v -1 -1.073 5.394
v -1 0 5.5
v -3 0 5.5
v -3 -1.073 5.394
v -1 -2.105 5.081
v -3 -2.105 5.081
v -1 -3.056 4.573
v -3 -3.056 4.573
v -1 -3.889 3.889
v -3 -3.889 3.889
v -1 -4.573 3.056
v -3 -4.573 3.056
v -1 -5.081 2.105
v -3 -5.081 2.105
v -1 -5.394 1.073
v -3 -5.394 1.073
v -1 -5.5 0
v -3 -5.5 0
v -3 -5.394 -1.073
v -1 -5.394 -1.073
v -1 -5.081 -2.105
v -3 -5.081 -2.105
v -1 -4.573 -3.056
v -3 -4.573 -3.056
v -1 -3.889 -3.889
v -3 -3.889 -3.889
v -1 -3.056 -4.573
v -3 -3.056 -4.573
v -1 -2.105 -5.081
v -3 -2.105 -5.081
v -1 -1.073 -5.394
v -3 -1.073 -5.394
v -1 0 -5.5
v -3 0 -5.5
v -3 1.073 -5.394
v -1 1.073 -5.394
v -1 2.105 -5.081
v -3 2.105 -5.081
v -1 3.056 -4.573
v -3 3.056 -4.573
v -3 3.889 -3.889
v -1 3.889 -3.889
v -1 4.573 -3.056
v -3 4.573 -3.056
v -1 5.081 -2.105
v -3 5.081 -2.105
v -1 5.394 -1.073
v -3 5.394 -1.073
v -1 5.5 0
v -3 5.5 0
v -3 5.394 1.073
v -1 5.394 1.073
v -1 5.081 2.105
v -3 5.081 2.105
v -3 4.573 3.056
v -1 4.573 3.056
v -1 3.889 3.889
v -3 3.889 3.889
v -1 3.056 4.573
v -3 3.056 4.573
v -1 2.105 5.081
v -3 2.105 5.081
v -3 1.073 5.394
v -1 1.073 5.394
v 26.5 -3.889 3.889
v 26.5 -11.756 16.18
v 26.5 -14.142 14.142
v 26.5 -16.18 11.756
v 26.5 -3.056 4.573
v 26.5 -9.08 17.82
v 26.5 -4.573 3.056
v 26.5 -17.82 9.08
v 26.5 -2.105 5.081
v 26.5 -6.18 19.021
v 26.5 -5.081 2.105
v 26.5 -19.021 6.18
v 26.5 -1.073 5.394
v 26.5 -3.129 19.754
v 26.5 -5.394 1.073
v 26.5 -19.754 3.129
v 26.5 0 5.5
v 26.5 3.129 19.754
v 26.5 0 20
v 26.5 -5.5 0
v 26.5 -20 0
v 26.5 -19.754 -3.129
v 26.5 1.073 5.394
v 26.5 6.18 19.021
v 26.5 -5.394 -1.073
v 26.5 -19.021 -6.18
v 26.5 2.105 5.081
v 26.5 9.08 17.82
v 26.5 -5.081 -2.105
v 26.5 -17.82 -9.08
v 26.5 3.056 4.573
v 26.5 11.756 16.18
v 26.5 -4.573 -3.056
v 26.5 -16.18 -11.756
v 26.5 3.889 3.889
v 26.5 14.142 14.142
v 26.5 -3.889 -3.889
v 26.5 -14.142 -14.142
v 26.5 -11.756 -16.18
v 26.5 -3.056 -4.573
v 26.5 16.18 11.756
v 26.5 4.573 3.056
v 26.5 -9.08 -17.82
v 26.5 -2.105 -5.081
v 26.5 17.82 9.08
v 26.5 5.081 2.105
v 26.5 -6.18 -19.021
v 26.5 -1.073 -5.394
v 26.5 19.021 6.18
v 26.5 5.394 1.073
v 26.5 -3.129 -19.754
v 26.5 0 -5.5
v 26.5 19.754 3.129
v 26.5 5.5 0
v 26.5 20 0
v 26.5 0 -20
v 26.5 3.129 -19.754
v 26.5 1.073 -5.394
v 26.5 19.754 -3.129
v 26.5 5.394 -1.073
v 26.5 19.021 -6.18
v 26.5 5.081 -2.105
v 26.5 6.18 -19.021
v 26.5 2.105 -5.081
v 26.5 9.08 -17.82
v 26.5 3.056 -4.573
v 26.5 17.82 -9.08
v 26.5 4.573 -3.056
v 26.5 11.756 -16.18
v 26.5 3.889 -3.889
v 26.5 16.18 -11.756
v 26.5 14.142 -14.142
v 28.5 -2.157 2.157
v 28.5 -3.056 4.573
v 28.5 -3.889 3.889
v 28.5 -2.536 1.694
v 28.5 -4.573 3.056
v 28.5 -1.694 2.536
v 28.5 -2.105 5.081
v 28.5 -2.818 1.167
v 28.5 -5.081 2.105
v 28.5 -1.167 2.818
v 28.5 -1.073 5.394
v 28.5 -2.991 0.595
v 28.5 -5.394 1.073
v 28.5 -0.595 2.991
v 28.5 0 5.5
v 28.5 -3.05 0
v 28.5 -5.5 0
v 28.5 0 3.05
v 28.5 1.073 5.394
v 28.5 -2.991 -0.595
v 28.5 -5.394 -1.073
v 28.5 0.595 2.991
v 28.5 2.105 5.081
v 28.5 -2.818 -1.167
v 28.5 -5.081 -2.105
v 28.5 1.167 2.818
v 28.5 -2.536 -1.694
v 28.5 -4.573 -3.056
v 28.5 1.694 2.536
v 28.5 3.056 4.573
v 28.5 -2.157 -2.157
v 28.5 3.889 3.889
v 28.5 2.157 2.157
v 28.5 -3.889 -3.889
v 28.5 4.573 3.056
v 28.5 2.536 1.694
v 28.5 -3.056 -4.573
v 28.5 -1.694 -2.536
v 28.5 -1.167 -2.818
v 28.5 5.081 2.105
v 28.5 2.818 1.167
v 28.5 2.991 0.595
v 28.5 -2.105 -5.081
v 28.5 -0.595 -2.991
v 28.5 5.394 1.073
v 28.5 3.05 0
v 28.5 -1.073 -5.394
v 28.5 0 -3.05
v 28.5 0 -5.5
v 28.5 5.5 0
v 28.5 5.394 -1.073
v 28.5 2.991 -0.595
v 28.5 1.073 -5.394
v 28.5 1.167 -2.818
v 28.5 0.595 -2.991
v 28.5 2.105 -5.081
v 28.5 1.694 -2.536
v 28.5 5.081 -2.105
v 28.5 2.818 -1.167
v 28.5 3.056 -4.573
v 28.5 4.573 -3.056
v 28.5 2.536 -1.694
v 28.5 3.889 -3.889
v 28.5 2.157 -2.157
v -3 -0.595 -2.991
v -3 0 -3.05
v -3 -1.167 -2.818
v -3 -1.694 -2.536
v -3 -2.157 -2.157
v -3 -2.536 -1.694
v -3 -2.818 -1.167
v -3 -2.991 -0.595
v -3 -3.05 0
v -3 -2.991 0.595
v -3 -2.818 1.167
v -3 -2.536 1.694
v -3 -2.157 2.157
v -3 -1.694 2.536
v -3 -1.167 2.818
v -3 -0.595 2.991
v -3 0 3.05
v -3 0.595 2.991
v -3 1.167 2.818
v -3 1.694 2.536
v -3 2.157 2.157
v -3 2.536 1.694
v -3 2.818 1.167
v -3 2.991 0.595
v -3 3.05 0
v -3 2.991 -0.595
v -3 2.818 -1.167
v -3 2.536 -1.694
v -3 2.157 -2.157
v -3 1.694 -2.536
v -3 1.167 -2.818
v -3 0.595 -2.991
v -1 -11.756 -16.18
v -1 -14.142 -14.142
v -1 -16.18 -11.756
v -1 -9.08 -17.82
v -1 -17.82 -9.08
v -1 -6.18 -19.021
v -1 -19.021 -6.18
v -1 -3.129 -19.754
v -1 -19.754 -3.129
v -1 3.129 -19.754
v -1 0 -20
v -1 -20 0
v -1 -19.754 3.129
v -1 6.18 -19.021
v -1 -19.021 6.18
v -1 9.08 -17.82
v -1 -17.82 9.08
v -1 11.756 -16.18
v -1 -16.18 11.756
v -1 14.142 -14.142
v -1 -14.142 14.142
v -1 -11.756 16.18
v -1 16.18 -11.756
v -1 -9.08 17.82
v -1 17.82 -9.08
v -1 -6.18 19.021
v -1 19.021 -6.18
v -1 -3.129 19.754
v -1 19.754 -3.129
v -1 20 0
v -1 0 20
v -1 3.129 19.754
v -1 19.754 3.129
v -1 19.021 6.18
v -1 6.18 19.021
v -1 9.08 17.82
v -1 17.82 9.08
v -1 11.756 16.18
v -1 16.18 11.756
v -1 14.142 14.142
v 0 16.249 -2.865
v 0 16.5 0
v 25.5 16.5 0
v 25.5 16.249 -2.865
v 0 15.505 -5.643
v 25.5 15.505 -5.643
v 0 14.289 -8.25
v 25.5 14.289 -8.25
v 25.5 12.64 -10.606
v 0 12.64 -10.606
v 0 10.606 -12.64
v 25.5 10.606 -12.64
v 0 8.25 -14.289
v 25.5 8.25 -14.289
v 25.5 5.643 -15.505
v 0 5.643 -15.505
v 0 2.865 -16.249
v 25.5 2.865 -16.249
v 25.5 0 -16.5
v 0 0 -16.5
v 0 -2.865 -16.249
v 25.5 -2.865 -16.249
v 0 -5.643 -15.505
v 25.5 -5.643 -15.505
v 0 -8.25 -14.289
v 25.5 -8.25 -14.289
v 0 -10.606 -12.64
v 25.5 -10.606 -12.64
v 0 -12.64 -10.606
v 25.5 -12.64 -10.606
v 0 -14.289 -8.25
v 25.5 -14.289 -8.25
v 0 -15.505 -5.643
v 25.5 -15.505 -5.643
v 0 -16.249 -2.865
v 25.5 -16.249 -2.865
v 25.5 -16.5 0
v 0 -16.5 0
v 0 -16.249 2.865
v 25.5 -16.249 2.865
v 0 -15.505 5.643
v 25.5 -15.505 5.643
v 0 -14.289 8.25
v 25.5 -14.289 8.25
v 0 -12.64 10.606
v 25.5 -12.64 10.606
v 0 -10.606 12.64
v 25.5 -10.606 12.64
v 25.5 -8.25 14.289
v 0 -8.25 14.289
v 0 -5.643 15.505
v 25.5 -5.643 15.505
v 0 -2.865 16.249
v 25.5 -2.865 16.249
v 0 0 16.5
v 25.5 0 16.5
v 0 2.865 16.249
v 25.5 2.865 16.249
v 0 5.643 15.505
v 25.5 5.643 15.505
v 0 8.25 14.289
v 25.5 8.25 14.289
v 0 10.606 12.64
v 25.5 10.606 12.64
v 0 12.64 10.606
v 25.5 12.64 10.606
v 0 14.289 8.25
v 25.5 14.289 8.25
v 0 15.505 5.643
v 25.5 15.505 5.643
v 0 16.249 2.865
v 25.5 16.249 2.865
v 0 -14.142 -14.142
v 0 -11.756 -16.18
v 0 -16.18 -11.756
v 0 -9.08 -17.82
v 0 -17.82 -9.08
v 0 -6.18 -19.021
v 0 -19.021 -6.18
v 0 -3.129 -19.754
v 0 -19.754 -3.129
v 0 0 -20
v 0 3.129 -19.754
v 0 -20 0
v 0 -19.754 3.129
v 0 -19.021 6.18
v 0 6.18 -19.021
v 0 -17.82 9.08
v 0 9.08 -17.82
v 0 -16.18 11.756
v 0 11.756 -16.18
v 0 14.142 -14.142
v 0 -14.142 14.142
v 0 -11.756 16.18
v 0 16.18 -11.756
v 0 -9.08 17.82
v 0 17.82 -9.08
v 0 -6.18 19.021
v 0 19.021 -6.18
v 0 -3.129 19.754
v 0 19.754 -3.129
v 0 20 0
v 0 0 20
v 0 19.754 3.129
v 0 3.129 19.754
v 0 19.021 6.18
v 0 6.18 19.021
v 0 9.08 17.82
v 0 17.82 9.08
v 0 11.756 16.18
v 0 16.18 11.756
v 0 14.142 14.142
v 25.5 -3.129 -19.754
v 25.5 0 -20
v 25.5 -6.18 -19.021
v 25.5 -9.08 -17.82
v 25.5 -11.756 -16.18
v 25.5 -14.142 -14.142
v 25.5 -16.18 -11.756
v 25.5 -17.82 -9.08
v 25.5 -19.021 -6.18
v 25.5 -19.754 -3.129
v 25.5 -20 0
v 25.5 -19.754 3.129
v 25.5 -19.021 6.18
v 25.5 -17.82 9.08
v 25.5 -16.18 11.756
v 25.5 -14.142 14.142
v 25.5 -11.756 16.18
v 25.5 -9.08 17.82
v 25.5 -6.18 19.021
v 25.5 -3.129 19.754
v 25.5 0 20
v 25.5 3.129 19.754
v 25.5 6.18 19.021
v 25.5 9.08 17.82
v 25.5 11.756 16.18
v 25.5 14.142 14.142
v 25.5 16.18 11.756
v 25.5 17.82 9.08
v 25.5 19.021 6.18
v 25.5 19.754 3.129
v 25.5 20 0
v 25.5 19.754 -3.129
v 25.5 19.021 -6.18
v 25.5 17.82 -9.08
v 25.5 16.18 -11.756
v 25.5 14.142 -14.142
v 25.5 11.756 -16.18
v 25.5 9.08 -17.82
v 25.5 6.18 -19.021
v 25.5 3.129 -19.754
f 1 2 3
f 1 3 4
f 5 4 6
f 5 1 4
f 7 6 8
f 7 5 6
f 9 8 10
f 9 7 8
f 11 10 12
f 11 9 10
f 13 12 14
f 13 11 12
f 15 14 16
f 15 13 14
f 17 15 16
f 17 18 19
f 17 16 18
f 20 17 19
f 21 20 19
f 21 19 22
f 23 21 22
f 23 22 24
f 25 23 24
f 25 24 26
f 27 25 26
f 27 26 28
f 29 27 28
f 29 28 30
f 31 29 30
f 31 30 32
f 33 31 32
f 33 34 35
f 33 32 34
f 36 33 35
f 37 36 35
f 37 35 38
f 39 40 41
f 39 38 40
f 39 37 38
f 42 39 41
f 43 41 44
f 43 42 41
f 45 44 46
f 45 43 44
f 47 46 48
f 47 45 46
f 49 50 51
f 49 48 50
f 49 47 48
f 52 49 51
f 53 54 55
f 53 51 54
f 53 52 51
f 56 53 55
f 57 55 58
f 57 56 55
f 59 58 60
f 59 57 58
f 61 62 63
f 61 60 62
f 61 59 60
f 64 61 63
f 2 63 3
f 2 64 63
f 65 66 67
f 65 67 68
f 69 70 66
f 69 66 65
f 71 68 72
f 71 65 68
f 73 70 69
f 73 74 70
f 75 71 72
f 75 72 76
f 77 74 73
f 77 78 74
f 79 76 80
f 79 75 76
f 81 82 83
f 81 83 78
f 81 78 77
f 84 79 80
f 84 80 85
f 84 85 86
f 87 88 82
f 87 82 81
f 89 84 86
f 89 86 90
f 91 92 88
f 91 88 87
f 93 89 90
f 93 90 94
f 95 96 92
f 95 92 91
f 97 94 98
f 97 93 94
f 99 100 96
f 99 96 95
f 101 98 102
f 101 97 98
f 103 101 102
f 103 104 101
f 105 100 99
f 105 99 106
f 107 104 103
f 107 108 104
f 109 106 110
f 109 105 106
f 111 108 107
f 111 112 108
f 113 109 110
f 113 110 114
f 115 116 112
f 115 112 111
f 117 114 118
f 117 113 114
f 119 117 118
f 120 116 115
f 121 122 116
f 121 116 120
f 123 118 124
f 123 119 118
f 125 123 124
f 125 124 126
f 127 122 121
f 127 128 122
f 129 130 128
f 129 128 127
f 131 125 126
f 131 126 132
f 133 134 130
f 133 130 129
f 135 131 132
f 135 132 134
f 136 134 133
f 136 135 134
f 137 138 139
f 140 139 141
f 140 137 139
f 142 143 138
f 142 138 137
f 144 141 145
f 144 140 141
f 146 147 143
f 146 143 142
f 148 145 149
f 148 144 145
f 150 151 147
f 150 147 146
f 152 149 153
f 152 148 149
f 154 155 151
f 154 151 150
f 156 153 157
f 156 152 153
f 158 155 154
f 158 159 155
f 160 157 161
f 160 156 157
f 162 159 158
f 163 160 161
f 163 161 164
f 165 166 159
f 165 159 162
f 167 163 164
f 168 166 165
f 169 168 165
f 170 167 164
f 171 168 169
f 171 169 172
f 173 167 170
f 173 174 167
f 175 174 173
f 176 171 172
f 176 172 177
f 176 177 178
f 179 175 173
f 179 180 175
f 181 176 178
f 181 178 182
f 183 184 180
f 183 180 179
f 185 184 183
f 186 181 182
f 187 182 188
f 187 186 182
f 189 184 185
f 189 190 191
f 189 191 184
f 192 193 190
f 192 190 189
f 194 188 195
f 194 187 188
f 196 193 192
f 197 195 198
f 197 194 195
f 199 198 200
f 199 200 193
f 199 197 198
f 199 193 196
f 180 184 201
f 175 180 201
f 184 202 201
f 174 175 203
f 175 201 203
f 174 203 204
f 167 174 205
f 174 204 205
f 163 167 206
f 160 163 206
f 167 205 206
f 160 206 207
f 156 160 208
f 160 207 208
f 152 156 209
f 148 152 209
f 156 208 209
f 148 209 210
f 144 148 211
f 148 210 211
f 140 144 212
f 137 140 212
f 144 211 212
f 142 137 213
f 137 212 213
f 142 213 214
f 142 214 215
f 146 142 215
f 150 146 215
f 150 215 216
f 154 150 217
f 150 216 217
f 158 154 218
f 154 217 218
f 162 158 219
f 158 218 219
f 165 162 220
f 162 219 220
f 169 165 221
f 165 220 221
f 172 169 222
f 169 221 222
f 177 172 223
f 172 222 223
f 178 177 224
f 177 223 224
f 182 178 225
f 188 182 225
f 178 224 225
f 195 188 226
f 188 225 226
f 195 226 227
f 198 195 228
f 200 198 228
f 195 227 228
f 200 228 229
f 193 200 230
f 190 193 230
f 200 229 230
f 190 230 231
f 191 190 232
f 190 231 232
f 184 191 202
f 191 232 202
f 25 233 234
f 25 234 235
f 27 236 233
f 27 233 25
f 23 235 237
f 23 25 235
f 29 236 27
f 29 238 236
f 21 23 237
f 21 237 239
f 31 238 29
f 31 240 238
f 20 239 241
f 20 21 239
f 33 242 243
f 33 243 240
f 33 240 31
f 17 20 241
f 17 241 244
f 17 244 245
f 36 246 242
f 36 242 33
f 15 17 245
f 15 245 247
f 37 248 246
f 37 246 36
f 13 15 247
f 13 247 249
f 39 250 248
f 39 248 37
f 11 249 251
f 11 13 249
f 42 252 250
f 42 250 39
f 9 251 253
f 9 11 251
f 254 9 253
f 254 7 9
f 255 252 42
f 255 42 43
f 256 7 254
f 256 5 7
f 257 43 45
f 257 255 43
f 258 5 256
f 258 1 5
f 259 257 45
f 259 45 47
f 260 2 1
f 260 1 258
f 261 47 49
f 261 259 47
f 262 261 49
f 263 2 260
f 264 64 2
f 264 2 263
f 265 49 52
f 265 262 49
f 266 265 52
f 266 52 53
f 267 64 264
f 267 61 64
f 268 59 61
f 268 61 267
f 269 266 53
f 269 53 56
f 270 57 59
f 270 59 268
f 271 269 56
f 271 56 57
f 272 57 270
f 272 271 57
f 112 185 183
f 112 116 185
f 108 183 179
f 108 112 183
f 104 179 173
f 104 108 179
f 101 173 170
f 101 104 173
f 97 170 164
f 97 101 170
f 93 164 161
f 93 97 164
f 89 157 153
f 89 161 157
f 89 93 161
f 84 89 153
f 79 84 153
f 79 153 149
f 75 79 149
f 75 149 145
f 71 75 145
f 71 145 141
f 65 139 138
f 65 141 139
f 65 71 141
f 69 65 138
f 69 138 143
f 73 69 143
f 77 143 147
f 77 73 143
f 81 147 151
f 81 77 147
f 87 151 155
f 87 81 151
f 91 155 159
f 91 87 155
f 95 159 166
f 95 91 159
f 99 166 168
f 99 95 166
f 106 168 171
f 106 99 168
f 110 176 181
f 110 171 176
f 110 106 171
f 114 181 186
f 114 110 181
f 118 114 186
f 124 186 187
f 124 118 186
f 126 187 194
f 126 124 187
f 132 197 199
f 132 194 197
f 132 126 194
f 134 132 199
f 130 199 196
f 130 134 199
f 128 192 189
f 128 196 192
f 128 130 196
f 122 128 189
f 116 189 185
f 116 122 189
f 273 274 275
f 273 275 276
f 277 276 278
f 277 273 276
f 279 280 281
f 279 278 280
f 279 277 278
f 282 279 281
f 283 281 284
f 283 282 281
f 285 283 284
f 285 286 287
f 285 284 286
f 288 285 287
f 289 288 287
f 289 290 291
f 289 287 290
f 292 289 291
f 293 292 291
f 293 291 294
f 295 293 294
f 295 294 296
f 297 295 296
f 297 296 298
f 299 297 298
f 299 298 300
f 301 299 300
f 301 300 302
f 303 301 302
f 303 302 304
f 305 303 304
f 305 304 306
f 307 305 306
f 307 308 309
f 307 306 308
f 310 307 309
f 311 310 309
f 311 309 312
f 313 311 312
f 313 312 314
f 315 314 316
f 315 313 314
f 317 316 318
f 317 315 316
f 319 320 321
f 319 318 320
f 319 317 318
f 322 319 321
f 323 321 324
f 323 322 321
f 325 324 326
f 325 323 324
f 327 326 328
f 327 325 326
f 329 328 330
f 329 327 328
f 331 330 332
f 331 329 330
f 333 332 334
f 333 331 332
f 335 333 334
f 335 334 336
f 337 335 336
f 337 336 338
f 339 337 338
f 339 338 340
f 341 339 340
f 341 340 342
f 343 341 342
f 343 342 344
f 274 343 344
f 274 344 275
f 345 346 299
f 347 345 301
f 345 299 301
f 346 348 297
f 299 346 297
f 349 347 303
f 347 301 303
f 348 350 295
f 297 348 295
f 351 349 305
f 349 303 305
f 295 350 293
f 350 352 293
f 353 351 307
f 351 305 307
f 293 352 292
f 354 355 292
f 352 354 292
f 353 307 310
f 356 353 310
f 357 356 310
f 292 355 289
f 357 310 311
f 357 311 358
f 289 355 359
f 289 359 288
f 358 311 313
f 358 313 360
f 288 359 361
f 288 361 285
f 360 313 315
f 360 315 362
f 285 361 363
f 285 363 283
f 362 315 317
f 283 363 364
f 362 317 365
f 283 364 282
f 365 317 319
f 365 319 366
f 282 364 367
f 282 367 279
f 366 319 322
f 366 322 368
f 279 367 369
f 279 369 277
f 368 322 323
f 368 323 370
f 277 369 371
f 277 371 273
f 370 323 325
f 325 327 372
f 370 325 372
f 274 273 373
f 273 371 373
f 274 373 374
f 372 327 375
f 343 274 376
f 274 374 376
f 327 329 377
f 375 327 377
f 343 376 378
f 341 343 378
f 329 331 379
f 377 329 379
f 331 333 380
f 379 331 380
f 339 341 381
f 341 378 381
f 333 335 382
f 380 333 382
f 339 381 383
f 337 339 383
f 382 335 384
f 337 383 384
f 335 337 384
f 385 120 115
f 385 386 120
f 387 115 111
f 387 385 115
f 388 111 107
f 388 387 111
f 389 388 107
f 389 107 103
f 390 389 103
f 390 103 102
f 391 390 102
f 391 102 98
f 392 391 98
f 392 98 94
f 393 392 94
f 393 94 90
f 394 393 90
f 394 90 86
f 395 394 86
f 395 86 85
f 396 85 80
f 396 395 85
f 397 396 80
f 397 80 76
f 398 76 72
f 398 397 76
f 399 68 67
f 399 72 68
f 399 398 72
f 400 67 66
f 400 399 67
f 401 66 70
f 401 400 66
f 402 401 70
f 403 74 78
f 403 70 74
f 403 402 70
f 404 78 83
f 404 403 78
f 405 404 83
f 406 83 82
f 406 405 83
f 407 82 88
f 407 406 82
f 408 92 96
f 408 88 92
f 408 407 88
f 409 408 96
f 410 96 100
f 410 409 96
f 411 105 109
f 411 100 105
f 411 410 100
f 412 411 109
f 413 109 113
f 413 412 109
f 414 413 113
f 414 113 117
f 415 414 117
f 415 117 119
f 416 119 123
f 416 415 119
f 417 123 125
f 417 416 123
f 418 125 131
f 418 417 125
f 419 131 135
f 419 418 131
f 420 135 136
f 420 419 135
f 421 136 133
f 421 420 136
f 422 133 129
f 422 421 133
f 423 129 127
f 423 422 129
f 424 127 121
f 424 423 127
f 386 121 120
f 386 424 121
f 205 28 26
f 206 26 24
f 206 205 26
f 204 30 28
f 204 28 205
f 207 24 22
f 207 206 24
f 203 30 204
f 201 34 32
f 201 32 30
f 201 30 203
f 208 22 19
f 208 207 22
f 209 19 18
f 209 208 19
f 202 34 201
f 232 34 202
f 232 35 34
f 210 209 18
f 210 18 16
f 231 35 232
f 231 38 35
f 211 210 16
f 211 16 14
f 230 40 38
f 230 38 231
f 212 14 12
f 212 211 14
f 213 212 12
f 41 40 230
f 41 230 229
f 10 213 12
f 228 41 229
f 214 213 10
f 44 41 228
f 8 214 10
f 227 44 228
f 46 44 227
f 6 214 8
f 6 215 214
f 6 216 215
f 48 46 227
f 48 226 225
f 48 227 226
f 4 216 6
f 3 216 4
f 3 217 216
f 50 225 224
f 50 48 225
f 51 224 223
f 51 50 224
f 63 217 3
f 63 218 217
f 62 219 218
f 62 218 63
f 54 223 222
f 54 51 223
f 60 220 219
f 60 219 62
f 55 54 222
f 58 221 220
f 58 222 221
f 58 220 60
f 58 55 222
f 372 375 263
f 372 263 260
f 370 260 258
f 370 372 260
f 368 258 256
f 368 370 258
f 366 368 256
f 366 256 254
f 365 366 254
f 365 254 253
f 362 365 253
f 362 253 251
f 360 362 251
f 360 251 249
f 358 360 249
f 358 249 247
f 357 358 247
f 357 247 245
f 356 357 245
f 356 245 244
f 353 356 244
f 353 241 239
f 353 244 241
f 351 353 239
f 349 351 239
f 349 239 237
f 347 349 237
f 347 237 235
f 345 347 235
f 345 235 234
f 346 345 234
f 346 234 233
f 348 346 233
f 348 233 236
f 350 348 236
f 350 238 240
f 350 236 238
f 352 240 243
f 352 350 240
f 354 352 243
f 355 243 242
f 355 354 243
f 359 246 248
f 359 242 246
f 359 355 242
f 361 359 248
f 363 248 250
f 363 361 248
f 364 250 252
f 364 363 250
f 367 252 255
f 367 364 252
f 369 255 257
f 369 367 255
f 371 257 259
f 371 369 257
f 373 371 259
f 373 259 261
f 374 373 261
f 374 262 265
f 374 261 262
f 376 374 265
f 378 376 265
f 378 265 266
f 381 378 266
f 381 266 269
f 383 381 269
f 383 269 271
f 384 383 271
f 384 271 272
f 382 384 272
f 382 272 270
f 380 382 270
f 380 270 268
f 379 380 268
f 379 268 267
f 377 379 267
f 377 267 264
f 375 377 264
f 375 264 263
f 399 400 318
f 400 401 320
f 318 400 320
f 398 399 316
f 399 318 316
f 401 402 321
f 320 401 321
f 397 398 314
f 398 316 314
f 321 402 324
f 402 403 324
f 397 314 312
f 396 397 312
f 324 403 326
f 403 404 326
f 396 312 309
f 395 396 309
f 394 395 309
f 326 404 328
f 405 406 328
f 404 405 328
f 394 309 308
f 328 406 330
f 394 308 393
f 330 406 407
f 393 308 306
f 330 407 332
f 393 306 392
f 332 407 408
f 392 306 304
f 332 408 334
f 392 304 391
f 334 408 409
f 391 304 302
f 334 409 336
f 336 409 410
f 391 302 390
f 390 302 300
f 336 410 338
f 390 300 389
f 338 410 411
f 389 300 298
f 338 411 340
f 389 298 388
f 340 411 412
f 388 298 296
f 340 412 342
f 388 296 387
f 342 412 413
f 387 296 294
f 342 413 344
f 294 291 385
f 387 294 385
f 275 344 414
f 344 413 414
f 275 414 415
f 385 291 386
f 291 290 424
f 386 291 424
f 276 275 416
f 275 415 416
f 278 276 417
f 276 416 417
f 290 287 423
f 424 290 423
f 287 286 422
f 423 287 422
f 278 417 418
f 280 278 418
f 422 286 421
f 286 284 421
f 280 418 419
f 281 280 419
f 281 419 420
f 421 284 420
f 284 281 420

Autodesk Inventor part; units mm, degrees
ref_plane "YZ Plane" through (0, 0, 0) normal (1, 0, 0) x (0, 1, 0)
ref_plane "XZ Plane" through (0, 0, 0) normal (0, 1, 0) x (-1, 0, 0)
ref_plane "XY Plane" through (0, 0, 0) normal (0, 0, 1) x (1, 0, 0)
sketch "スケッチ1" plane through (0, 0, 0) normal (1, 0, 0) x (0, 1, 0)
  circle A0 centre (0, 0) radius 16.5
  dimension "d0" = 33
extrude "押し出し1" add sketch "スケッチ1" along normal blind 25.5
sketch "スケッチ2" plane through (25.5, 0, 0) normal (1, 0, 0) x (0, 0, -1)
  circle A0 centre (0, 0) radius 20
  dimension "d3" = 40
extrude "押し出し2" add sketch "スケッチ2" along normal blind 1
sketch "スケッチ3" plane through (0, 0, 0) normal (-1, 0, 0) x (0, 0, 1)
  circle A0 centre (0, 0) radius 20
  dimension "d6" = 40
extrude "押し出し3" add sketch "スケッチ3" along normal blind 1
sketch "スケッチ4" plane through (26.5, 0, 0) normal (1, 0, 0) x (0, 0, -1)
  circle A0 centre (0, 0) radius 5.5
  dimension "d9" = 11
extrude "押し出し4" add sketch "スケッチ4" along normal blind 2
sketch "スケッチ5" plane through (-1, 0, 0) normal (-1, 0, 0) x (0, 0, 1)
  circle A0 centre (0, 0) radius 5.5
  dimension "d12" = 11
extrude "押し出し5" add sketch "スケッチ5" along normal blind 2
sketch "スケッチ6" plane through (28.5, 0, 0) normal (1, 0, 0) x (0, 0, -1)
  circle A0 centre (0, 0) radius 5.5 projected
hole "穴1" at (28.5, 0, 0) direction (-1, 0, 0) diameter 6.1 end through all
properties part number "CLS_24.5N" material "ポリプロピレン"
